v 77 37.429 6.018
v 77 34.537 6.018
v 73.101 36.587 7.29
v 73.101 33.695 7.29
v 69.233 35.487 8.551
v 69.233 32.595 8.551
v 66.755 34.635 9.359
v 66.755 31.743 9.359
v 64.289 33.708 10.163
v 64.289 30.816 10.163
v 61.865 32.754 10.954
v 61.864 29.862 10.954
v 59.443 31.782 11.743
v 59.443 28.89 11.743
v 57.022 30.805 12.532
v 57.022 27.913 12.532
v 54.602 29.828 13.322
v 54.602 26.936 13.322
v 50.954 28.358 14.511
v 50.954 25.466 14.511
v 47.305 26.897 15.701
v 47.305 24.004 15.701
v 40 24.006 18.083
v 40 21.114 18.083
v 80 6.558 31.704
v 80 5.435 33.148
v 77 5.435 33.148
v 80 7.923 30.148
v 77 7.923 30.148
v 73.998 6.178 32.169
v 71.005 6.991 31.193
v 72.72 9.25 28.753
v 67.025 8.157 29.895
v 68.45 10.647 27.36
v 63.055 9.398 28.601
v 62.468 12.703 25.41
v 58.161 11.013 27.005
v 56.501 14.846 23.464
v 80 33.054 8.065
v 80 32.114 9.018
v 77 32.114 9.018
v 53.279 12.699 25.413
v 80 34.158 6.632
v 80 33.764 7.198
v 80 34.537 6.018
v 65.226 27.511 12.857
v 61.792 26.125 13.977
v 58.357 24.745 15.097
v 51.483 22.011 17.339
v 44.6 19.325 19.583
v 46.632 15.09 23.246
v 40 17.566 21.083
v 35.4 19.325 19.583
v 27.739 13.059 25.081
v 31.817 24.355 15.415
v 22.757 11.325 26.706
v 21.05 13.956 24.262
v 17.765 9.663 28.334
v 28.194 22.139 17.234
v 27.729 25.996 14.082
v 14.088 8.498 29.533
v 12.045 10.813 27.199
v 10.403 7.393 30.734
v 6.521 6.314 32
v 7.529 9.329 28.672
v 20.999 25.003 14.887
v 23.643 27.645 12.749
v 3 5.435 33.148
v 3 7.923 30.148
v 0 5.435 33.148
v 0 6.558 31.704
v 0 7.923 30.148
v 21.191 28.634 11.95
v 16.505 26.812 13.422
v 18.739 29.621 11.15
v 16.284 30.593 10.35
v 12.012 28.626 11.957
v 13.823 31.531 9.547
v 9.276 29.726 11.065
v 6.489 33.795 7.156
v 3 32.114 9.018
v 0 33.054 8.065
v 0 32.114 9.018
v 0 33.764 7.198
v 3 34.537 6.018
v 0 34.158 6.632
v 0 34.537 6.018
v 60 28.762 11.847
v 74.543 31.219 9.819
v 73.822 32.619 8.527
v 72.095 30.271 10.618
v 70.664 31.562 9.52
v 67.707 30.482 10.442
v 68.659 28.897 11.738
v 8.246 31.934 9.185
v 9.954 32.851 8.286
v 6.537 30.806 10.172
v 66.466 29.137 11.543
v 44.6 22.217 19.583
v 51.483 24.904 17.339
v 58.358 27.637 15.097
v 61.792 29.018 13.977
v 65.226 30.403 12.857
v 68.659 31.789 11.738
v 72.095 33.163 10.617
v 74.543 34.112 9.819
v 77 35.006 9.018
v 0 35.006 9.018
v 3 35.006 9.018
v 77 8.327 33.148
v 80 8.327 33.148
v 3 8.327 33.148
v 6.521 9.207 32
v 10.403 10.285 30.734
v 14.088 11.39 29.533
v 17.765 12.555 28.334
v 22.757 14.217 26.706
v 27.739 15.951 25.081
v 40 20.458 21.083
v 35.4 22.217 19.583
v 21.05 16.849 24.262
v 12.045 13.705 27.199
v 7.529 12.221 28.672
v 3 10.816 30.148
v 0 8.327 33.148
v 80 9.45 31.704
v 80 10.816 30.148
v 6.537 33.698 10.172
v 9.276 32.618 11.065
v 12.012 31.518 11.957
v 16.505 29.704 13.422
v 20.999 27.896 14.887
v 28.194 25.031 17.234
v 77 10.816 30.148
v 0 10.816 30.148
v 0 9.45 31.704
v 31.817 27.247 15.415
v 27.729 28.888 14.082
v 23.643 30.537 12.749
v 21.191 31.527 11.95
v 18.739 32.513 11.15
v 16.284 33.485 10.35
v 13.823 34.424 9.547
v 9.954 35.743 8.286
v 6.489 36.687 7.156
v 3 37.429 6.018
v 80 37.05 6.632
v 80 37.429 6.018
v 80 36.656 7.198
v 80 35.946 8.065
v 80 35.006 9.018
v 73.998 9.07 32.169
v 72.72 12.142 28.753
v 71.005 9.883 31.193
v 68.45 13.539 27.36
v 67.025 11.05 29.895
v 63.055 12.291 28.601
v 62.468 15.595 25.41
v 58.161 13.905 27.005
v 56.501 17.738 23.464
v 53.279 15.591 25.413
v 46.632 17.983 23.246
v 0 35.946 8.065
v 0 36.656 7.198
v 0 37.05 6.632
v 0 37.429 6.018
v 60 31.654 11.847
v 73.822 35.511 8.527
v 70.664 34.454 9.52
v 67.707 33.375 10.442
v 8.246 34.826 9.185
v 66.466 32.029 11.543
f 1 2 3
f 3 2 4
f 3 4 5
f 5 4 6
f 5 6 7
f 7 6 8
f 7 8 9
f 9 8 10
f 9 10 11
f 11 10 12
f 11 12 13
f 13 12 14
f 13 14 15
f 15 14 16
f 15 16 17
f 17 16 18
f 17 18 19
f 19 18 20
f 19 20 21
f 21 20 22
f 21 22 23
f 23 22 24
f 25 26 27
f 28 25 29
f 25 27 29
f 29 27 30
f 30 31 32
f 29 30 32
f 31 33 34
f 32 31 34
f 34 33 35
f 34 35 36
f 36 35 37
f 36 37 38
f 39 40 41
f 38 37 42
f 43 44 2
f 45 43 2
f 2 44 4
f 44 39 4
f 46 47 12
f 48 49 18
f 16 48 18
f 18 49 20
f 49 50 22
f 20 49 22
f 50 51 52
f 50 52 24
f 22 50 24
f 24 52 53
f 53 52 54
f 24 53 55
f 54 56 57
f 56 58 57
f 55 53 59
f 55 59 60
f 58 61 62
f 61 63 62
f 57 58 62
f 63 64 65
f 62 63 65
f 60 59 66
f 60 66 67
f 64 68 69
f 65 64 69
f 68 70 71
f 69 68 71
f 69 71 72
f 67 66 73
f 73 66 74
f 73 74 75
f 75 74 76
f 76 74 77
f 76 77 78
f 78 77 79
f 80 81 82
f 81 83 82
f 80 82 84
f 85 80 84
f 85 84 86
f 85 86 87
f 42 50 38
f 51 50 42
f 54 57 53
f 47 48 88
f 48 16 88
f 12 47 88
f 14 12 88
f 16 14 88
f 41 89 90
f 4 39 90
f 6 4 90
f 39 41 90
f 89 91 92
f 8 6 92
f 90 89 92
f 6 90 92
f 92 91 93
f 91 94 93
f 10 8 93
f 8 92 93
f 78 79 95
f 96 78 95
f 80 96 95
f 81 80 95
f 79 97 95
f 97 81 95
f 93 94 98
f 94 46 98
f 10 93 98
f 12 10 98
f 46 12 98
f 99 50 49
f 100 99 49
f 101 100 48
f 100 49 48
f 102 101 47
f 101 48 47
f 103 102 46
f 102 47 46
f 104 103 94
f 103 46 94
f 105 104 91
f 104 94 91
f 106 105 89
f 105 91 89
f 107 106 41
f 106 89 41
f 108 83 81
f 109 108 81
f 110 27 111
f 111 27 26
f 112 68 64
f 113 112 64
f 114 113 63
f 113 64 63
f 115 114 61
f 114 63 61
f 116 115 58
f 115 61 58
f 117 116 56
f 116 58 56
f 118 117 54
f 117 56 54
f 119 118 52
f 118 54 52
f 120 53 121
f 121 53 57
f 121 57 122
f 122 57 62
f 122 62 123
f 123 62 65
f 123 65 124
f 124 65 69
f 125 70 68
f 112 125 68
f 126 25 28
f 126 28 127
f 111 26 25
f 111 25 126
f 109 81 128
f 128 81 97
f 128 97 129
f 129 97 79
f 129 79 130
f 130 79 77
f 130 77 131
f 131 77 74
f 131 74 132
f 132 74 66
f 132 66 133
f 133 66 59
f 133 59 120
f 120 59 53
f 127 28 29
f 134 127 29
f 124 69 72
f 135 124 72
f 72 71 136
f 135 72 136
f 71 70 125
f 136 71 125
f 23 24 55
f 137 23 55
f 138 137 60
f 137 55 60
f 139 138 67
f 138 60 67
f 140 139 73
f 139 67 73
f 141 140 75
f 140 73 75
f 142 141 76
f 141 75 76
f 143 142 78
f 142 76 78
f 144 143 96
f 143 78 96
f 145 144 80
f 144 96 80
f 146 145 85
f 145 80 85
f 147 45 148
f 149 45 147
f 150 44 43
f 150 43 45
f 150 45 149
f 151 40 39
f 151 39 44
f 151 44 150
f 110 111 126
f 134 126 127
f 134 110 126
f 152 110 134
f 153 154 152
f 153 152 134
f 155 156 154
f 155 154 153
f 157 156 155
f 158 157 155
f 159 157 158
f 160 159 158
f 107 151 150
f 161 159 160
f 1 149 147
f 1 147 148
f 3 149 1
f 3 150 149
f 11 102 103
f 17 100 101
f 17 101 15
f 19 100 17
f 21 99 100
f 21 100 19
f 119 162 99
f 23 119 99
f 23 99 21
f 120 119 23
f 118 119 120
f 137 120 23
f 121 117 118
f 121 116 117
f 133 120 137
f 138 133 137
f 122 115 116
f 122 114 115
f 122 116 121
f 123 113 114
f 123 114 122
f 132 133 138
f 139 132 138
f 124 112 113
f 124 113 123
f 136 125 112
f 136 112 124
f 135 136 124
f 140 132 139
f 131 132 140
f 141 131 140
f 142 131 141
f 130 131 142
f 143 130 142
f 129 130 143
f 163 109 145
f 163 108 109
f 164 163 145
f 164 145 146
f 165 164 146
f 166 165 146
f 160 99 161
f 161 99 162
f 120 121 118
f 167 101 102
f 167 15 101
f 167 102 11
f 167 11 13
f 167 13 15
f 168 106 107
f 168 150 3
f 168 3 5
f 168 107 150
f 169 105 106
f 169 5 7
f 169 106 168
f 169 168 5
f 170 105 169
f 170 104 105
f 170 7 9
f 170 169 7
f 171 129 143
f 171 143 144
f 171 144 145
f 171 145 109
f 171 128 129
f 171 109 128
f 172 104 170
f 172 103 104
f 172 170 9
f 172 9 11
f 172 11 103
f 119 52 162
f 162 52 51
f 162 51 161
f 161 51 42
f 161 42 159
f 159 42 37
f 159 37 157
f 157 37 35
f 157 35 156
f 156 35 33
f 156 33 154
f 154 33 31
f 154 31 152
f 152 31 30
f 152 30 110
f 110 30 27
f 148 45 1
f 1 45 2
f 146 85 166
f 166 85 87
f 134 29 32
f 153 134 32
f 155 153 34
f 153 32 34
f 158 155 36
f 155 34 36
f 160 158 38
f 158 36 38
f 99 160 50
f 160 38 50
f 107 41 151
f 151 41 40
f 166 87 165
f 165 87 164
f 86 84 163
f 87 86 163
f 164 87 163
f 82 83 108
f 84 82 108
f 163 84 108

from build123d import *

# Parameters (mm, degrees)
F1_DEPTH = 80
F2_W     = 115.2630522847
F2_H     = 63.0402415991
F3_DEPTH = 50


with BuildPart() as f1:
    # F0 (on Right) → F1 (new body)
    with BuildSketch(Plane.YZ):
        with BuildLine():
            add(Edge.make_bspline(
                [(4.1407536375, 35.3801552647), (4.2758405627, 35.0538718719), (7.2258461835, 29.0660046135), (29.3302090847, 11.4785589747), (33.7961603555, 7.7122646756), (35.460181914, 4.2848211133), (35.8498667485, 3.1943865861)],
                knots=[0.0722973238, 0.0722973238, 0.0722973238, 0.0722973238, 0.0848091888, 0.2906596564, 0.3924191098, 0.4351785649, 0.4351785649, 0.4351785649, 0.4351785649], degree=3))
            Line((35.8498667485, 3.1943865861), (38.397080011, 4.0794351968))
            add(Edge.make_bspline(
                [(7.1589336367, 35.0923453365), (7.2692126818, 34.8534723334), (10.3681905457, 28.8669104967), (32.2223267398, 11.4785589747), (36.5375953872, 7.8393406492), (38.078875768, 4.8330086497), (38.397080011, 4.0794351968)],
                knots=[0.0759211795, 0.0759211795, 0.0759211795, 0.0759211795, 0.0848091888, 0.2906596564, 0.3924191098, 0.4233569902, 0.4233569902, 0.4233569902, 0.4233569902], degree=3))
            Line((7.1589336367, 35.0923453365), (4.1407536375, 35.3801552647))
        make_face()
    extrude(amount=F1_DEPTH)

    # F2 (on Front) → F3 (cut)
    with BuildSketch(Plane.XZ):
        with Locations((41.0025008023, 15.8190391958)):
            Rectangle(F2_W, F2_H)
        Polygon((0, 30.1482619814), (0, 33.1482619814), (3, 33.1482619814), (40, 21.0831741459), (77, 33.1482619814), (80, 33.1482619814), (80, 30.1482619814), (77, 30.1482619814), (44.6000493951, 19.5831741459), (77, 9.0180863104), (80, 9.0180863104), (80, 6.0180863104), (77, 6.0180863104), (40, 18.0831741459), (3, 6.0180863104), (0, 6.0180863104), (0, 9.0180863104), (3, 9.0180863104), (35.3999506049, 19.5831741459), (3, 30.1482619814), align=None, mode=Mode.SUBTRACT)
    extrude(amount=-F3_DEPTH, mode=Mode.SUBTRACT)


solid = f1.part
